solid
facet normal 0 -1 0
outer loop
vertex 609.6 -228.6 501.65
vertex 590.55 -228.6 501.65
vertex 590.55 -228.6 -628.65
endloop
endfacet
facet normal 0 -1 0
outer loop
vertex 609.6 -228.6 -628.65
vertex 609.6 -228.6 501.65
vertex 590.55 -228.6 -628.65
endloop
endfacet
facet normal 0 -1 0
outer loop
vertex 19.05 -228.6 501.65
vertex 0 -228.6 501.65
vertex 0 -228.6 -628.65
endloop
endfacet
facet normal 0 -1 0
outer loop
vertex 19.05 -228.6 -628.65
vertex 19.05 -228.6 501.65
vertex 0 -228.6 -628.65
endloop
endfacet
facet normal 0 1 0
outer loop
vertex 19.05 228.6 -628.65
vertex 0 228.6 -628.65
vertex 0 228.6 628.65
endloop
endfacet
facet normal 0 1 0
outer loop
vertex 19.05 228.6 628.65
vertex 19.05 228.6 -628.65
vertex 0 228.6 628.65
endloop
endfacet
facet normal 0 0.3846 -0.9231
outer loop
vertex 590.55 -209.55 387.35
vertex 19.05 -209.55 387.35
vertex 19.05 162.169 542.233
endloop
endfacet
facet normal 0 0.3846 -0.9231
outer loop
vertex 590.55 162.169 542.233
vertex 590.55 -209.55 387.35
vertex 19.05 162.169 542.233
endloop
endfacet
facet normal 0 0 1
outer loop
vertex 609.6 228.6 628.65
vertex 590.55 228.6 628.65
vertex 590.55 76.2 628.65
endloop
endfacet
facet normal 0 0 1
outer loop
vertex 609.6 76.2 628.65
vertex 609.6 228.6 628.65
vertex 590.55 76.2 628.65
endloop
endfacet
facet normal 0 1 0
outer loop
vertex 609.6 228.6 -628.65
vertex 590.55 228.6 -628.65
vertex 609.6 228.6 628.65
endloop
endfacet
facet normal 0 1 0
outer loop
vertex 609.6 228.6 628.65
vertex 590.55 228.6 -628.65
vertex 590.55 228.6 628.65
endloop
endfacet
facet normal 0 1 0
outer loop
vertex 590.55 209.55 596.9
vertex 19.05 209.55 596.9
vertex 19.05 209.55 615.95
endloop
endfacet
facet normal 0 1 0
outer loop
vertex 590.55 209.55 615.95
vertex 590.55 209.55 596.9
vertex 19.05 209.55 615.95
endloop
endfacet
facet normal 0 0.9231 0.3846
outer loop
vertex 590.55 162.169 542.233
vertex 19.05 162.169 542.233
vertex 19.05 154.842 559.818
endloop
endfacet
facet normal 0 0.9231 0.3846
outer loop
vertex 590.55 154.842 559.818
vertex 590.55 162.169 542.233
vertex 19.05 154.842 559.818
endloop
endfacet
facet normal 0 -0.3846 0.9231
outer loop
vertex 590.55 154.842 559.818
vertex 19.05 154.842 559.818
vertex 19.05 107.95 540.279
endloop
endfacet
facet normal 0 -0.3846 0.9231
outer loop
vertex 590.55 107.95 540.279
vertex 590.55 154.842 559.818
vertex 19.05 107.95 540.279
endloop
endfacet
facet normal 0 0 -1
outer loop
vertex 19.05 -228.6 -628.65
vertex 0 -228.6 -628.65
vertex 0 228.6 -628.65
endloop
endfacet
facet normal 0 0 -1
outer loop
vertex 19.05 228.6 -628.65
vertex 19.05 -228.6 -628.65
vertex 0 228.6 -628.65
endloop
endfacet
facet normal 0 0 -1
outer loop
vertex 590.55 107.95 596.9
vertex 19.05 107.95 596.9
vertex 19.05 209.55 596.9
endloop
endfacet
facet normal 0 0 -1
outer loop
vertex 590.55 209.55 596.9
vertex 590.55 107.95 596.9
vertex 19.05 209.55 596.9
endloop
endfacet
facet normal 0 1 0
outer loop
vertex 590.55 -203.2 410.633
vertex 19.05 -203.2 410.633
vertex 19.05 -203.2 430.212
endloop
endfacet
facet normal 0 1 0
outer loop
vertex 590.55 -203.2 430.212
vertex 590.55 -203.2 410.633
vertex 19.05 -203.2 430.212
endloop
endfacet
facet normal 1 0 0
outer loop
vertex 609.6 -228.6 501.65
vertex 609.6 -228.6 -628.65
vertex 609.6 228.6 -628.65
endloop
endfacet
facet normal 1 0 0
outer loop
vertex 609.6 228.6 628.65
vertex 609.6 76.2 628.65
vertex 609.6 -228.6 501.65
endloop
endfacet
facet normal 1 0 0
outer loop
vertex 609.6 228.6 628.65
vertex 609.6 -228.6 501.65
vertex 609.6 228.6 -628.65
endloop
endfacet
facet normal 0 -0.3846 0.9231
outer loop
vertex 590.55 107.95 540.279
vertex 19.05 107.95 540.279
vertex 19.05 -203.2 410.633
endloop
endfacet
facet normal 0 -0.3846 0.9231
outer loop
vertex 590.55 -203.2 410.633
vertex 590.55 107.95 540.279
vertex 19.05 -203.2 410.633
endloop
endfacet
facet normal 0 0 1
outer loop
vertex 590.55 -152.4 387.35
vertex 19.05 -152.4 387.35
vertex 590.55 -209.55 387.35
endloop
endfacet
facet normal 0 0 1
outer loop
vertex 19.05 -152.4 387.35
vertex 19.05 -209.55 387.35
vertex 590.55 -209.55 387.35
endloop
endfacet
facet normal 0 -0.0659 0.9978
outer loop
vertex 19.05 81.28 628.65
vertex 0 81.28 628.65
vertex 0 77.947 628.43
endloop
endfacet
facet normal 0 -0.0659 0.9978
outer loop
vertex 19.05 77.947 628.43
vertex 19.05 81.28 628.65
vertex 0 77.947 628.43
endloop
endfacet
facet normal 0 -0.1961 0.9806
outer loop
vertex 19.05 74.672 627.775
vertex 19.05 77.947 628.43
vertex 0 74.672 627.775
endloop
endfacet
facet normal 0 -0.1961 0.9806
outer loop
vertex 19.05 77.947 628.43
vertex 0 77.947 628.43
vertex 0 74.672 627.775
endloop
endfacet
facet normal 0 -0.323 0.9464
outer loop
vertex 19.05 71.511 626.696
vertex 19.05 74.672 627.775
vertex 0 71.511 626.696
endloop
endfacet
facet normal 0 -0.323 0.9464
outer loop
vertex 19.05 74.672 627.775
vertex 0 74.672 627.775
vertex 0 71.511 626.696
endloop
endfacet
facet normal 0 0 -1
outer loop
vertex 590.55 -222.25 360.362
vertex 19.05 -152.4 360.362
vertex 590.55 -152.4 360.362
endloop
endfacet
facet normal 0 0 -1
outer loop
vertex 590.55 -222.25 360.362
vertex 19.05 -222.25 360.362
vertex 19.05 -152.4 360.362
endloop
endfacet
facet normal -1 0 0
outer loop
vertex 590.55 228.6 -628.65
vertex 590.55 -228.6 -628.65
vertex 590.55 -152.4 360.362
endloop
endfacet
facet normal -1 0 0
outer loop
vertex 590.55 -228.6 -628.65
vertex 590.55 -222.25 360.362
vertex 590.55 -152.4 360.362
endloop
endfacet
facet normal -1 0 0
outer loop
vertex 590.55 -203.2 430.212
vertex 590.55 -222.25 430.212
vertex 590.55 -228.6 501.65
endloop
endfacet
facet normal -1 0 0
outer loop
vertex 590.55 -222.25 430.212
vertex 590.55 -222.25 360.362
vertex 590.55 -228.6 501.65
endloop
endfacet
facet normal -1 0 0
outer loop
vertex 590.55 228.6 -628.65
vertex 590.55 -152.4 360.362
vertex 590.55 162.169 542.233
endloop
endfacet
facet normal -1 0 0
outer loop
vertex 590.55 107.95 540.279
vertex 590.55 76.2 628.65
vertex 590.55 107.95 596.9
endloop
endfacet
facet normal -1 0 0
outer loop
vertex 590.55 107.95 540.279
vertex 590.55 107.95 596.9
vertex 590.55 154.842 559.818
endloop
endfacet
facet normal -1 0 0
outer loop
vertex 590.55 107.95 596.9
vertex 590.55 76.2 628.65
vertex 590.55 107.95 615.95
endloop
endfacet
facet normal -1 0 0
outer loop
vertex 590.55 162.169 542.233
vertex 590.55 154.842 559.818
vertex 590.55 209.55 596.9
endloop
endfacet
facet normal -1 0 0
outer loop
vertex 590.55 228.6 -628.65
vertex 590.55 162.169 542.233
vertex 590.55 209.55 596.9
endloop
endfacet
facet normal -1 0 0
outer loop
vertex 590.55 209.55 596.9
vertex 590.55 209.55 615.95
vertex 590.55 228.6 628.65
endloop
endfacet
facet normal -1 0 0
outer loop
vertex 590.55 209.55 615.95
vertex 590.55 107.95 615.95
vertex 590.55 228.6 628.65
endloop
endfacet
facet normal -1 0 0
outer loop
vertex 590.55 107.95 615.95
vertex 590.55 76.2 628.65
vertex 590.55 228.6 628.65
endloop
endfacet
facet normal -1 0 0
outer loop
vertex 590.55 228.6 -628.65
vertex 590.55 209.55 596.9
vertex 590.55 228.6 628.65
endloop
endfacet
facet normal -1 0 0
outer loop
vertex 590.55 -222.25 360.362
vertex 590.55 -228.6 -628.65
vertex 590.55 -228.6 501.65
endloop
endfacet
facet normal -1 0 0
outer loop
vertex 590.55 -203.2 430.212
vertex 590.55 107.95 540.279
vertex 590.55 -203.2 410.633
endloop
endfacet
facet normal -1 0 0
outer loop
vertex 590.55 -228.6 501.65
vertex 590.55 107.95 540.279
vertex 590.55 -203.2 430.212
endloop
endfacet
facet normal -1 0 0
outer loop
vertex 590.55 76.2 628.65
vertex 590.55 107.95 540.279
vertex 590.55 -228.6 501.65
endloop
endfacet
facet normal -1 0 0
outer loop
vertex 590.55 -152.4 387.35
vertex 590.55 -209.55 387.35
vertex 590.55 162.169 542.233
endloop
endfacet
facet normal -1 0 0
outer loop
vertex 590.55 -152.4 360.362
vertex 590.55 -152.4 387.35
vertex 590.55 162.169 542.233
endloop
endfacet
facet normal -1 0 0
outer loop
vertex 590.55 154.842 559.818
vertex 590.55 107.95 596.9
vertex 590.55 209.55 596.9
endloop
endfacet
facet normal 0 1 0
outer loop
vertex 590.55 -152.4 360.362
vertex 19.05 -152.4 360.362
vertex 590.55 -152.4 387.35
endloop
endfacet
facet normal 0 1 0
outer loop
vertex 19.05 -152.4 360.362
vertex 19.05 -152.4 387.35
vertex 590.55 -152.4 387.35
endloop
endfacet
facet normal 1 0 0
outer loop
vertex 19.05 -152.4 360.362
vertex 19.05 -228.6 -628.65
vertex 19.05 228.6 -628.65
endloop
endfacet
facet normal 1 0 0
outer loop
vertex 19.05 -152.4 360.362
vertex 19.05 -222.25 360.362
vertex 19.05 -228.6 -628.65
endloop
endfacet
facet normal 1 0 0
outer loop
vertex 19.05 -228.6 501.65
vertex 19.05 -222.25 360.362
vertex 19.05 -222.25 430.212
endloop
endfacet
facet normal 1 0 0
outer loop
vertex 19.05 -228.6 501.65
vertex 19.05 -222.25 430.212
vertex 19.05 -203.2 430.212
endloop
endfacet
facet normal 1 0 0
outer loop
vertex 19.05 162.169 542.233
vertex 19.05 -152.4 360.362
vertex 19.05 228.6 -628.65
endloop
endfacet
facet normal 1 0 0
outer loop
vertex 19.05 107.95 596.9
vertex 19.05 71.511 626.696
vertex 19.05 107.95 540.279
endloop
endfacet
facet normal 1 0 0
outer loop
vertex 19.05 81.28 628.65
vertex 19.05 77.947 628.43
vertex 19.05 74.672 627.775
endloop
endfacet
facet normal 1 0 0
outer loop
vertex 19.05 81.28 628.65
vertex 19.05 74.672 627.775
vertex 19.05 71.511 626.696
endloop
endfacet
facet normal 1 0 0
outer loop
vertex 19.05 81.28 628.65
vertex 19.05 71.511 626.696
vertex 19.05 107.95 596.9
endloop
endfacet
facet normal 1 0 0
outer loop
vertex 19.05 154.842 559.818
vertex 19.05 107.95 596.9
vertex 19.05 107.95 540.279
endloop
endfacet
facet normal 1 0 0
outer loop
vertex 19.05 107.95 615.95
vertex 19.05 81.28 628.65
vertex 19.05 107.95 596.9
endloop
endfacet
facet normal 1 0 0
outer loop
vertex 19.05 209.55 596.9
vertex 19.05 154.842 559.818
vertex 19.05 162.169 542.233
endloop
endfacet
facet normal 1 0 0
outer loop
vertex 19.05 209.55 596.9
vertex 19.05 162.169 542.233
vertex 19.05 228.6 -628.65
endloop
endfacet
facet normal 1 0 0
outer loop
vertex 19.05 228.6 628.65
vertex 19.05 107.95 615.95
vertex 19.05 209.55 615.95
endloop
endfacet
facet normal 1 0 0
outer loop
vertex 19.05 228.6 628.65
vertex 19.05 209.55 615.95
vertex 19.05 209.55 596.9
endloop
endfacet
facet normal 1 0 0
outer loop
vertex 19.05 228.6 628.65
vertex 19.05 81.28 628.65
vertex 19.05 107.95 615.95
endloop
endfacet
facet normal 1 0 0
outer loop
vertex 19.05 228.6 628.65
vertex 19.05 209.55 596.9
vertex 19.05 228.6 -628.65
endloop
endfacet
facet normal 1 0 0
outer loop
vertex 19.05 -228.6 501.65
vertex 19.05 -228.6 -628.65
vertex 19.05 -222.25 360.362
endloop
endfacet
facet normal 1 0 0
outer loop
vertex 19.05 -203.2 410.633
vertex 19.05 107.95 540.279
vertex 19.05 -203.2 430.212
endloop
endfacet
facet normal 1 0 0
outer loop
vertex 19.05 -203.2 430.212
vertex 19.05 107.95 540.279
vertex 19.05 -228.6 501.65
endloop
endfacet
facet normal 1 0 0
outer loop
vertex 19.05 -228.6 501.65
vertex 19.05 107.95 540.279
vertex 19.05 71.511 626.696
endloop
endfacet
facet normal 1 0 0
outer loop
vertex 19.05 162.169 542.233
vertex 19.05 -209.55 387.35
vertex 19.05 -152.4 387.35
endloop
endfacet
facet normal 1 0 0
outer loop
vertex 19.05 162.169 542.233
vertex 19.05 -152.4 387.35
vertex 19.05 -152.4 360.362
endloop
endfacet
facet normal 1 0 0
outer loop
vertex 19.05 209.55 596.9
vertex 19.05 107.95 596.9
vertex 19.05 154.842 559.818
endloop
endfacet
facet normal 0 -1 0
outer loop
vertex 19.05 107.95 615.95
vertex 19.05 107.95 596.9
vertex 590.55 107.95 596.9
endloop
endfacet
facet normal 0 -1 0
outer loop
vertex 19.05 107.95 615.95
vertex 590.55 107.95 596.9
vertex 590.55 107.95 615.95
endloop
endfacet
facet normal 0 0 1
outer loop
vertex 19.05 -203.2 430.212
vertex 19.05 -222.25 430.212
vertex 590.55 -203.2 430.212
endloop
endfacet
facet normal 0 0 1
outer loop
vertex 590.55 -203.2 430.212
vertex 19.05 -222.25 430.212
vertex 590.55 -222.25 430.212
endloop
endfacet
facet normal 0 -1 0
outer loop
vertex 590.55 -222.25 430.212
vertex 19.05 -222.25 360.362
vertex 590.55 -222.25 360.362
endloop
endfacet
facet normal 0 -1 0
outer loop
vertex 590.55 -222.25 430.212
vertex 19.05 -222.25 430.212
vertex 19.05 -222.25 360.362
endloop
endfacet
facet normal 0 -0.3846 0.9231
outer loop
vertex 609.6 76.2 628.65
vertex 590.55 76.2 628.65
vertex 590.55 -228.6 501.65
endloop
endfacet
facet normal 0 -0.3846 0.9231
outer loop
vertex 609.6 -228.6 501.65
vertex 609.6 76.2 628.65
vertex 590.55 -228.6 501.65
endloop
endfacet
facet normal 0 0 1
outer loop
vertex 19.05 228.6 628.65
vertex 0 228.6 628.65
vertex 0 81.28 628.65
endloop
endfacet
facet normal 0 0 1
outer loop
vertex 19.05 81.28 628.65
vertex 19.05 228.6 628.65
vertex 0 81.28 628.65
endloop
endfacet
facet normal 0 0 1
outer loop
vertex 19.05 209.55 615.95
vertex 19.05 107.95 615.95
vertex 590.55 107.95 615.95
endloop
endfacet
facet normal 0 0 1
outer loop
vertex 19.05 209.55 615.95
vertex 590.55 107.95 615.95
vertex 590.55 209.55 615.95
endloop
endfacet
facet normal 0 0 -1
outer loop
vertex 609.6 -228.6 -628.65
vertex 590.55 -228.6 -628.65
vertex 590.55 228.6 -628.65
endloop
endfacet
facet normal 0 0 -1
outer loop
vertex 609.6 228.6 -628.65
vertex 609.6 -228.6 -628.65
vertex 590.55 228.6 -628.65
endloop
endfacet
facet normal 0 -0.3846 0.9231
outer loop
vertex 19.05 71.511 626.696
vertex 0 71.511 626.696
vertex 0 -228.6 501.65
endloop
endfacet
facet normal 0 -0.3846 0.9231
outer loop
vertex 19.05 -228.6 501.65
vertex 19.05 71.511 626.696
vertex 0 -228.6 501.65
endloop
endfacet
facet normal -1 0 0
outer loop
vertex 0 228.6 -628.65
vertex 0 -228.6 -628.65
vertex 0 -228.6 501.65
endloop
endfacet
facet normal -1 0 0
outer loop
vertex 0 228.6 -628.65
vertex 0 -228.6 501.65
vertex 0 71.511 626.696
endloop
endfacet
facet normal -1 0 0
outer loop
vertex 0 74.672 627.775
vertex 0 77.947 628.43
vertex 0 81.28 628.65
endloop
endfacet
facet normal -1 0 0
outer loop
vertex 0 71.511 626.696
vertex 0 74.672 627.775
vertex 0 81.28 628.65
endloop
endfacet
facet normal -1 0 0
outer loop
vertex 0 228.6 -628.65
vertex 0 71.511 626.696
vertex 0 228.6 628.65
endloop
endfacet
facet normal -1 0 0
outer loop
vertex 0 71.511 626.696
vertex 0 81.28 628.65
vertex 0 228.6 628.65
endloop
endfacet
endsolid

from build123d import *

# Parameters (mm, degrees)
F1_DEPTH  = 19.05
F2_W      = 101.6
F2_H      = 19.05
F3_DEPTH  = 571.5
F5_DEPTH  = 571.5
F6_W      = 571.5
F6_H      = 50.8
F7_DEPTH  = 6.35
F8_DEPTH  = 6.35
F9_W      = 101.6
F9_H      = 19.05
F10_DEPTH = 19.05
F11_DEPTH = 19.05
F12_DEPTH = 50.8


with BuildPart() as f1:
    # F0 (on Right) → F1 (new body)
    with BuildSketch(Plane.YZ):
        with BuildLine():
            Line((228.6, -628.65), (228.6, 628.65))
            Line((228.6, 628.65), (81.28, 628.65))
            ThreePointArc((81.28, 628.65), (76.2986501675, 628.1567491625), (71.5107692308, 626.6961538462))
            Line((71.5107692308, 626.6961538462), (-228.6, 501.65))
            Line((-228.6, 501.65), (-228.6, -628.65))
            Line((-228.6, -628.65), (228.6, -628.65))
        make_face()
    extrude(amount=F1_DEPTH)

    # F2 (on face) → F3 (join)
    with BuildSketch(Plane.YZ.offset(19.05)):
        with Locations((158.75, 606.425)):
            Rectangle(F2_W, F2_H)
    extrude(amount=F3_DEPTH)

    # F4 (on face) → F5 (join)
    with BuildSketch(Plane.YZ.offset(19.05)):
        Polygon((-209.55, 430.2125), (-228.6, 430.2125), (-228.6, 400.05), (-209.55, 407.9875), align=None)
        Polygon((-209.55, 407.9875), (-228.6, 400.05), (-228.6, 379.4125), (-209.55, 387.35), align=None)
        Polygon((-209.55, 387.35), (-228.6, 379.4125), (-209.55, 379.4125), align=None)
        Polygon((107.95, 540.2791666667), (-209.55, 407.9875), (-209.55, 387.35), (162.1692307692, 542.2330128205), (154.8423076923, 559.8176282051), align=None)
    extrude(amount=F5_DEPTH)

    # F6 (on face) → F7 (cut)
    with BuildSketch(Plane.XZ.offset(228.6)):
        with Locations((304.8, 404.8125)):
            Rectangle(F6_W, F6_H)
    extrude(amount=-F7_DEPTH, mode=Mode.SUBTRACT)

    # F8 (add): faces of the model
    f8_faces = [f1.faces().sort_by_distance(p)[0] for p in [
        (304.8, -209.55, 419.1),
        (304.8, -209.55, 383.38125),
    ]]
    extrude(f8_faces, amount=F8_DEPTH)

    # F9 (on face) → F10 (join)
    with BuildSketch(Plane.YZ.offset(590.55)):
        Polygon((228.6, 628.65), (209.55, 628.65), (76.2, 628.65), (-228.6, 501.65), (-228.6, -628.65), (228.6, -628.65), align=None)
        with Locations((158.75, 606.425)):
            Rectangle(F9_W, F9_H, mode=Mode.SUBTRACT)
        with Locations((158.75, 606.425)):
            Rectangle(F9_W, F9_H)
    extrude(amount=F10_DEPTH)

    # F11 (add): a face of the model
    f11_faces = [f1.faces().sort_by_distance(p)[0] for p in [
        (304.8, -212.725, 379.4125),
    ]]
    extrude(f11_faces, amount=F11_DEPTH)

    # F12 (add): a face of the model
    f12_faces = [f1.faces().sort_by_distance(p)[0] for p in [
        (304.8, -203.2, 373.85625),
    ]]
    extrude(f12_faces, amount=F12_DEPTH)


solid = f1.part
